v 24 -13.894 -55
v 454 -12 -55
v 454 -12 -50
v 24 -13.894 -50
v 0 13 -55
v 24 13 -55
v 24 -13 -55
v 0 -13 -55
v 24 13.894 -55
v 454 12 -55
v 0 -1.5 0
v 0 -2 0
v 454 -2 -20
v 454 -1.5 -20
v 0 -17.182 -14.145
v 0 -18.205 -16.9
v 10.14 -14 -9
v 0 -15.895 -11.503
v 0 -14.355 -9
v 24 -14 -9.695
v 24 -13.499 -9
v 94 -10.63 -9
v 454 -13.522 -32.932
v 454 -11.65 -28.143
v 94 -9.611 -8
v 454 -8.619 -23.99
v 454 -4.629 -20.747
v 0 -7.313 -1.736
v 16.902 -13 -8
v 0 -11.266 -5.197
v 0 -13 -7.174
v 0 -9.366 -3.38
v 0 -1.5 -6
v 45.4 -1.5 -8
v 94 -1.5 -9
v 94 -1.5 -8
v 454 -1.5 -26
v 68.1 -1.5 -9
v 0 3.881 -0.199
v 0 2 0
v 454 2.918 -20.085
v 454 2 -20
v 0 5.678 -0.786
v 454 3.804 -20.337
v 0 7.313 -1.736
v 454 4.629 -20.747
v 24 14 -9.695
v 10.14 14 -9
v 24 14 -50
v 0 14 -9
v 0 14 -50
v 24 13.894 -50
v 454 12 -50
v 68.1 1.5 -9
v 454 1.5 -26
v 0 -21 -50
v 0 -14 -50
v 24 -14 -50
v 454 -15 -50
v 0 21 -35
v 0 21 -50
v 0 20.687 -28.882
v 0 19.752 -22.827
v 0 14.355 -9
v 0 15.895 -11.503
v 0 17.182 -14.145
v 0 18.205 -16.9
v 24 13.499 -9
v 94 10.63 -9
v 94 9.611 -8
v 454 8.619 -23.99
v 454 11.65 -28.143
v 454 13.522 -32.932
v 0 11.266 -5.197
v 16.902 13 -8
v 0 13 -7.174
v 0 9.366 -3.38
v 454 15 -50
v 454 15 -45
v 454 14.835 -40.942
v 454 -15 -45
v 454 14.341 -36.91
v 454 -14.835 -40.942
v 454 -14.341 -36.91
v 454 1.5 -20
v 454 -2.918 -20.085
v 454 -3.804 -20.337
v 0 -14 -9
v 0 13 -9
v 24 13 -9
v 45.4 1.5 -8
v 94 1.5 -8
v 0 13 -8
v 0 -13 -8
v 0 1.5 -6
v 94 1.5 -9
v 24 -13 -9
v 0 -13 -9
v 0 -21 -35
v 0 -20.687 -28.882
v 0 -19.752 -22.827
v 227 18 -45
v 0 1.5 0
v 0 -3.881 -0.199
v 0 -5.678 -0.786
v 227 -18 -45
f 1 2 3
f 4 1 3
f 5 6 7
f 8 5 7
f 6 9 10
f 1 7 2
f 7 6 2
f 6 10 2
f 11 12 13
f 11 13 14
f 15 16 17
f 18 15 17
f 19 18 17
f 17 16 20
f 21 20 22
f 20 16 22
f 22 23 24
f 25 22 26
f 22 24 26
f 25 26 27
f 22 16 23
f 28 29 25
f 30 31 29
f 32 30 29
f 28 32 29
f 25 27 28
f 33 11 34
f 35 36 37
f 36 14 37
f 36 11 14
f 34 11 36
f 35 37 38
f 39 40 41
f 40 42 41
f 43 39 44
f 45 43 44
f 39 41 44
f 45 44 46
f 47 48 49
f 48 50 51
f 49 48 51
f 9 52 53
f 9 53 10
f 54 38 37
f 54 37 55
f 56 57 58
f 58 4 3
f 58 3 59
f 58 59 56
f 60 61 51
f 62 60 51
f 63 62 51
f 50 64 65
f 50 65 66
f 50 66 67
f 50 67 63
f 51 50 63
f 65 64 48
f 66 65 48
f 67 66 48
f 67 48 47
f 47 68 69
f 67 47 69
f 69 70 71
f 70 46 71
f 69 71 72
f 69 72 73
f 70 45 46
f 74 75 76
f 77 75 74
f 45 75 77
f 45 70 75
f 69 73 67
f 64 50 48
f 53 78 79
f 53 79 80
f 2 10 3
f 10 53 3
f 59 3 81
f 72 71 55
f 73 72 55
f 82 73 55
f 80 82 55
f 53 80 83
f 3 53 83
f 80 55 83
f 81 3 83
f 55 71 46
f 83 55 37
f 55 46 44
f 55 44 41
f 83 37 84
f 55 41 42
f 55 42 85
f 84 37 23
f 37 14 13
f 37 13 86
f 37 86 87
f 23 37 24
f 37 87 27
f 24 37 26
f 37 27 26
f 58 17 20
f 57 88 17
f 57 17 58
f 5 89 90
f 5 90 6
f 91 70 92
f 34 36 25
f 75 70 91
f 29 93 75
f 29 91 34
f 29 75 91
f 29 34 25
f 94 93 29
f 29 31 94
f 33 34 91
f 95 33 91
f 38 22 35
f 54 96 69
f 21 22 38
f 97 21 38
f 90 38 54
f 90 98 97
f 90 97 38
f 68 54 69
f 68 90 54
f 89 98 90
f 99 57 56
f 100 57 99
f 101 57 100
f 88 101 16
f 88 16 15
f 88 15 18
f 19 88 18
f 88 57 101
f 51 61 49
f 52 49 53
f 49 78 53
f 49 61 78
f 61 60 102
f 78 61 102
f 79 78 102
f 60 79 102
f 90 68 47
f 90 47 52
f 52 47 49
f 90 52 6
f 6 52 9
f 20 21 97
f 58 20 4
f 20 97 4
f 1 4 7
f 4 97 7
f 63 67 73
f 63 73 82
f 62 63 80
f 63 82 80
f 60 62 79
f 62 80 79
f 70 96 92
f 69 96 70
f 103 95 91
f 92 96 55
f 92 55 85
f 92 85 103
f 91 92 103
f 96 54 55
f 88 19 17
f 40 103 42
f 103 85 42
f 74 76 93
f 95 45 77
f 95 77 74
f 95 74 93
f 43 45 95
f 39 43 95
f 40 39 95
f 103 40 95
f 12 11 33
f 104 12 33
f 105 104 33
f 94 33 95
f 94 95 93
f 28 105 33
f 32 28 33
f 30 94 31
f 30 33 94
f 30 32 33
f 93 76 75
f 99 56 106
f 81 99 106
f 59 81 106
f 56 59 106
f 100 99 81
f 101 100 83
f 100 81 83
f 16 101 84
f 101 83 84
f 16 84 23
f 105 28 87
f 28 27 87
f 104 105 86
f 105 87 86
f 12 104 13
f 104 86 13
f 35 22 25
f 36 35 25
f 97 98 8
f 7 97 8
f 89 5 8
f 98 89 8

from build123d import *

# Parameters (mm, degrees)
SKETCH4_W          = 55
SKETCH4_H          = 1
CUT_EXTRUDE1_DEPTH = 24
CUT_EXTRUDE2_DEPTH = 94


with BuildPart() as part:
    # Sketch2 → Loft1 section 0
    with BuildSketch(Plane(origin=(0, 0, 0), x_dir=(0, 0, -1), z_dir=(1, 0, 0))):
        with BuildLine():
            Line((55, 14), (55, -14))
            Line((55, -14), (50, -14))
            Line((50, -14), (50, -21))
            Line((50, -21), (35, -21))
            ThreePointArc((35, -21), (25.842604999, -20.29706668), (16.899777934, -18.204737227))
            ThreePointArc((16.899777934, -18.204737227), (8.448934824, -13.968669196), (1.735761871, -7.313270594))
            ThreePointArc((1.735761871, -7.313270594), (0.444938833, -4.794803825), (0, -2))
            Line((0, -2), (0, -1.5))
            Line((0, -1.5), (6, -1.5))
            Line((6, -1.5), (6, 1.5))
            Line((6, 1.5), (0, 1.5))
            Line((0, 1.5), (0, 2))
            ThreePointArc((0, 2), (0.444938833, 4.794803825), (1.735761871, 7.313270594))
            ThreePointArc((1.735761871, 7.313270594), (8.448934824, 13.968669196), (16.899777934, 18.204737227))
            ThreePointArc((16.899777934, 18.204737227), (25.842604999, 20.29706668), (35, 21))
            Line((35, 21), (50, 21))
            Line((50, 21), (50, 14))
            Line((50, 14), (55, 14))
        make_face()
    # Sketch3 → Loft1 section 1
    with BuildSketch(Plane(origin=(454, 0, 0), x_dir=(0, 0, -1), z_dir=(1, 0, 0))):
        with BuildLine():
            Line((55, 12), (55, -12))
            Line((55, -12), (50, -12))
            Line((50, -12), (50, -15))
            Line((50, -15), (45, -15))
            ThreePointArc((45, -15), (38.920867725, -14.629065584), (32.931933824, -13.521766031))
            ThreePointArc((32.931933824, -13.521766031), (25.968880514, -10.268222963), (20.746946568, -4.628980127))
            ThreePointArc((20.746946568, -4.628980127), (20.190360348, -3.366516162), (20, -2))
            Line((20, -2), (20, -1.5))
            Line((20, -1.5), (26, -1.5))
            Line((26, -1.5), (26, 1.5))
            Line((26, 1.5), (20, 1.5))
            Line((20, 1.5), (20, 2))
            ThreePointArc((20, 2), (20.190360348, 3.366516162), (20.746946568, 4.628980127))
            ThreePointArc((20.746946568, 4.628980127), (25.968880514, 10.268222963), (32.931933824, 13.521766031))
            ThreePointArc((32.931933824, 13.521766031), (38.920867725, 14.629065584), (45, 15))
            Line((45, 15), (50, 15))
            Line((50, 15), (50, 12))
            Line((50, 12), (55, 12))
        make_face()
    loft()

    # Sketch4 → Cut-Extrude1 (cut)
    with BuildSketch(Plane(origin=(0, 0, 0), x_dir=(0, 0, -1), z_dir=(1, 0, 0))):
        with Locations((27.5, 13.5)):
            Rectangle(SKETCH4_W, SKETCH4_H)
        with Locations((27.5, -13.5)):
            Rectangle(SKETCH4_W, SKETCH4_H)
    extrude(amount=CUT_EXTRUDE1_DEPTH, mode=Mode.SUBTRACT)

    # Sketch5 → Cut-Extrude2 (cut)
    with BuildSketch(Plane(origin=(0, 0, 0), x_dir=(0, 0, -1), z_dir=(1, 0, 0))):
        Polygon((9, 13), (9, -13), (9, -17.5), (8, -17.5), (8, -13), (8, 13), (8, 17.5), (9, 17.5), align=None)
    extrude(amount=CUT_EXTRUDE2_DEPTH, mode=Mode.SUBTRACT)


solid = part.part
